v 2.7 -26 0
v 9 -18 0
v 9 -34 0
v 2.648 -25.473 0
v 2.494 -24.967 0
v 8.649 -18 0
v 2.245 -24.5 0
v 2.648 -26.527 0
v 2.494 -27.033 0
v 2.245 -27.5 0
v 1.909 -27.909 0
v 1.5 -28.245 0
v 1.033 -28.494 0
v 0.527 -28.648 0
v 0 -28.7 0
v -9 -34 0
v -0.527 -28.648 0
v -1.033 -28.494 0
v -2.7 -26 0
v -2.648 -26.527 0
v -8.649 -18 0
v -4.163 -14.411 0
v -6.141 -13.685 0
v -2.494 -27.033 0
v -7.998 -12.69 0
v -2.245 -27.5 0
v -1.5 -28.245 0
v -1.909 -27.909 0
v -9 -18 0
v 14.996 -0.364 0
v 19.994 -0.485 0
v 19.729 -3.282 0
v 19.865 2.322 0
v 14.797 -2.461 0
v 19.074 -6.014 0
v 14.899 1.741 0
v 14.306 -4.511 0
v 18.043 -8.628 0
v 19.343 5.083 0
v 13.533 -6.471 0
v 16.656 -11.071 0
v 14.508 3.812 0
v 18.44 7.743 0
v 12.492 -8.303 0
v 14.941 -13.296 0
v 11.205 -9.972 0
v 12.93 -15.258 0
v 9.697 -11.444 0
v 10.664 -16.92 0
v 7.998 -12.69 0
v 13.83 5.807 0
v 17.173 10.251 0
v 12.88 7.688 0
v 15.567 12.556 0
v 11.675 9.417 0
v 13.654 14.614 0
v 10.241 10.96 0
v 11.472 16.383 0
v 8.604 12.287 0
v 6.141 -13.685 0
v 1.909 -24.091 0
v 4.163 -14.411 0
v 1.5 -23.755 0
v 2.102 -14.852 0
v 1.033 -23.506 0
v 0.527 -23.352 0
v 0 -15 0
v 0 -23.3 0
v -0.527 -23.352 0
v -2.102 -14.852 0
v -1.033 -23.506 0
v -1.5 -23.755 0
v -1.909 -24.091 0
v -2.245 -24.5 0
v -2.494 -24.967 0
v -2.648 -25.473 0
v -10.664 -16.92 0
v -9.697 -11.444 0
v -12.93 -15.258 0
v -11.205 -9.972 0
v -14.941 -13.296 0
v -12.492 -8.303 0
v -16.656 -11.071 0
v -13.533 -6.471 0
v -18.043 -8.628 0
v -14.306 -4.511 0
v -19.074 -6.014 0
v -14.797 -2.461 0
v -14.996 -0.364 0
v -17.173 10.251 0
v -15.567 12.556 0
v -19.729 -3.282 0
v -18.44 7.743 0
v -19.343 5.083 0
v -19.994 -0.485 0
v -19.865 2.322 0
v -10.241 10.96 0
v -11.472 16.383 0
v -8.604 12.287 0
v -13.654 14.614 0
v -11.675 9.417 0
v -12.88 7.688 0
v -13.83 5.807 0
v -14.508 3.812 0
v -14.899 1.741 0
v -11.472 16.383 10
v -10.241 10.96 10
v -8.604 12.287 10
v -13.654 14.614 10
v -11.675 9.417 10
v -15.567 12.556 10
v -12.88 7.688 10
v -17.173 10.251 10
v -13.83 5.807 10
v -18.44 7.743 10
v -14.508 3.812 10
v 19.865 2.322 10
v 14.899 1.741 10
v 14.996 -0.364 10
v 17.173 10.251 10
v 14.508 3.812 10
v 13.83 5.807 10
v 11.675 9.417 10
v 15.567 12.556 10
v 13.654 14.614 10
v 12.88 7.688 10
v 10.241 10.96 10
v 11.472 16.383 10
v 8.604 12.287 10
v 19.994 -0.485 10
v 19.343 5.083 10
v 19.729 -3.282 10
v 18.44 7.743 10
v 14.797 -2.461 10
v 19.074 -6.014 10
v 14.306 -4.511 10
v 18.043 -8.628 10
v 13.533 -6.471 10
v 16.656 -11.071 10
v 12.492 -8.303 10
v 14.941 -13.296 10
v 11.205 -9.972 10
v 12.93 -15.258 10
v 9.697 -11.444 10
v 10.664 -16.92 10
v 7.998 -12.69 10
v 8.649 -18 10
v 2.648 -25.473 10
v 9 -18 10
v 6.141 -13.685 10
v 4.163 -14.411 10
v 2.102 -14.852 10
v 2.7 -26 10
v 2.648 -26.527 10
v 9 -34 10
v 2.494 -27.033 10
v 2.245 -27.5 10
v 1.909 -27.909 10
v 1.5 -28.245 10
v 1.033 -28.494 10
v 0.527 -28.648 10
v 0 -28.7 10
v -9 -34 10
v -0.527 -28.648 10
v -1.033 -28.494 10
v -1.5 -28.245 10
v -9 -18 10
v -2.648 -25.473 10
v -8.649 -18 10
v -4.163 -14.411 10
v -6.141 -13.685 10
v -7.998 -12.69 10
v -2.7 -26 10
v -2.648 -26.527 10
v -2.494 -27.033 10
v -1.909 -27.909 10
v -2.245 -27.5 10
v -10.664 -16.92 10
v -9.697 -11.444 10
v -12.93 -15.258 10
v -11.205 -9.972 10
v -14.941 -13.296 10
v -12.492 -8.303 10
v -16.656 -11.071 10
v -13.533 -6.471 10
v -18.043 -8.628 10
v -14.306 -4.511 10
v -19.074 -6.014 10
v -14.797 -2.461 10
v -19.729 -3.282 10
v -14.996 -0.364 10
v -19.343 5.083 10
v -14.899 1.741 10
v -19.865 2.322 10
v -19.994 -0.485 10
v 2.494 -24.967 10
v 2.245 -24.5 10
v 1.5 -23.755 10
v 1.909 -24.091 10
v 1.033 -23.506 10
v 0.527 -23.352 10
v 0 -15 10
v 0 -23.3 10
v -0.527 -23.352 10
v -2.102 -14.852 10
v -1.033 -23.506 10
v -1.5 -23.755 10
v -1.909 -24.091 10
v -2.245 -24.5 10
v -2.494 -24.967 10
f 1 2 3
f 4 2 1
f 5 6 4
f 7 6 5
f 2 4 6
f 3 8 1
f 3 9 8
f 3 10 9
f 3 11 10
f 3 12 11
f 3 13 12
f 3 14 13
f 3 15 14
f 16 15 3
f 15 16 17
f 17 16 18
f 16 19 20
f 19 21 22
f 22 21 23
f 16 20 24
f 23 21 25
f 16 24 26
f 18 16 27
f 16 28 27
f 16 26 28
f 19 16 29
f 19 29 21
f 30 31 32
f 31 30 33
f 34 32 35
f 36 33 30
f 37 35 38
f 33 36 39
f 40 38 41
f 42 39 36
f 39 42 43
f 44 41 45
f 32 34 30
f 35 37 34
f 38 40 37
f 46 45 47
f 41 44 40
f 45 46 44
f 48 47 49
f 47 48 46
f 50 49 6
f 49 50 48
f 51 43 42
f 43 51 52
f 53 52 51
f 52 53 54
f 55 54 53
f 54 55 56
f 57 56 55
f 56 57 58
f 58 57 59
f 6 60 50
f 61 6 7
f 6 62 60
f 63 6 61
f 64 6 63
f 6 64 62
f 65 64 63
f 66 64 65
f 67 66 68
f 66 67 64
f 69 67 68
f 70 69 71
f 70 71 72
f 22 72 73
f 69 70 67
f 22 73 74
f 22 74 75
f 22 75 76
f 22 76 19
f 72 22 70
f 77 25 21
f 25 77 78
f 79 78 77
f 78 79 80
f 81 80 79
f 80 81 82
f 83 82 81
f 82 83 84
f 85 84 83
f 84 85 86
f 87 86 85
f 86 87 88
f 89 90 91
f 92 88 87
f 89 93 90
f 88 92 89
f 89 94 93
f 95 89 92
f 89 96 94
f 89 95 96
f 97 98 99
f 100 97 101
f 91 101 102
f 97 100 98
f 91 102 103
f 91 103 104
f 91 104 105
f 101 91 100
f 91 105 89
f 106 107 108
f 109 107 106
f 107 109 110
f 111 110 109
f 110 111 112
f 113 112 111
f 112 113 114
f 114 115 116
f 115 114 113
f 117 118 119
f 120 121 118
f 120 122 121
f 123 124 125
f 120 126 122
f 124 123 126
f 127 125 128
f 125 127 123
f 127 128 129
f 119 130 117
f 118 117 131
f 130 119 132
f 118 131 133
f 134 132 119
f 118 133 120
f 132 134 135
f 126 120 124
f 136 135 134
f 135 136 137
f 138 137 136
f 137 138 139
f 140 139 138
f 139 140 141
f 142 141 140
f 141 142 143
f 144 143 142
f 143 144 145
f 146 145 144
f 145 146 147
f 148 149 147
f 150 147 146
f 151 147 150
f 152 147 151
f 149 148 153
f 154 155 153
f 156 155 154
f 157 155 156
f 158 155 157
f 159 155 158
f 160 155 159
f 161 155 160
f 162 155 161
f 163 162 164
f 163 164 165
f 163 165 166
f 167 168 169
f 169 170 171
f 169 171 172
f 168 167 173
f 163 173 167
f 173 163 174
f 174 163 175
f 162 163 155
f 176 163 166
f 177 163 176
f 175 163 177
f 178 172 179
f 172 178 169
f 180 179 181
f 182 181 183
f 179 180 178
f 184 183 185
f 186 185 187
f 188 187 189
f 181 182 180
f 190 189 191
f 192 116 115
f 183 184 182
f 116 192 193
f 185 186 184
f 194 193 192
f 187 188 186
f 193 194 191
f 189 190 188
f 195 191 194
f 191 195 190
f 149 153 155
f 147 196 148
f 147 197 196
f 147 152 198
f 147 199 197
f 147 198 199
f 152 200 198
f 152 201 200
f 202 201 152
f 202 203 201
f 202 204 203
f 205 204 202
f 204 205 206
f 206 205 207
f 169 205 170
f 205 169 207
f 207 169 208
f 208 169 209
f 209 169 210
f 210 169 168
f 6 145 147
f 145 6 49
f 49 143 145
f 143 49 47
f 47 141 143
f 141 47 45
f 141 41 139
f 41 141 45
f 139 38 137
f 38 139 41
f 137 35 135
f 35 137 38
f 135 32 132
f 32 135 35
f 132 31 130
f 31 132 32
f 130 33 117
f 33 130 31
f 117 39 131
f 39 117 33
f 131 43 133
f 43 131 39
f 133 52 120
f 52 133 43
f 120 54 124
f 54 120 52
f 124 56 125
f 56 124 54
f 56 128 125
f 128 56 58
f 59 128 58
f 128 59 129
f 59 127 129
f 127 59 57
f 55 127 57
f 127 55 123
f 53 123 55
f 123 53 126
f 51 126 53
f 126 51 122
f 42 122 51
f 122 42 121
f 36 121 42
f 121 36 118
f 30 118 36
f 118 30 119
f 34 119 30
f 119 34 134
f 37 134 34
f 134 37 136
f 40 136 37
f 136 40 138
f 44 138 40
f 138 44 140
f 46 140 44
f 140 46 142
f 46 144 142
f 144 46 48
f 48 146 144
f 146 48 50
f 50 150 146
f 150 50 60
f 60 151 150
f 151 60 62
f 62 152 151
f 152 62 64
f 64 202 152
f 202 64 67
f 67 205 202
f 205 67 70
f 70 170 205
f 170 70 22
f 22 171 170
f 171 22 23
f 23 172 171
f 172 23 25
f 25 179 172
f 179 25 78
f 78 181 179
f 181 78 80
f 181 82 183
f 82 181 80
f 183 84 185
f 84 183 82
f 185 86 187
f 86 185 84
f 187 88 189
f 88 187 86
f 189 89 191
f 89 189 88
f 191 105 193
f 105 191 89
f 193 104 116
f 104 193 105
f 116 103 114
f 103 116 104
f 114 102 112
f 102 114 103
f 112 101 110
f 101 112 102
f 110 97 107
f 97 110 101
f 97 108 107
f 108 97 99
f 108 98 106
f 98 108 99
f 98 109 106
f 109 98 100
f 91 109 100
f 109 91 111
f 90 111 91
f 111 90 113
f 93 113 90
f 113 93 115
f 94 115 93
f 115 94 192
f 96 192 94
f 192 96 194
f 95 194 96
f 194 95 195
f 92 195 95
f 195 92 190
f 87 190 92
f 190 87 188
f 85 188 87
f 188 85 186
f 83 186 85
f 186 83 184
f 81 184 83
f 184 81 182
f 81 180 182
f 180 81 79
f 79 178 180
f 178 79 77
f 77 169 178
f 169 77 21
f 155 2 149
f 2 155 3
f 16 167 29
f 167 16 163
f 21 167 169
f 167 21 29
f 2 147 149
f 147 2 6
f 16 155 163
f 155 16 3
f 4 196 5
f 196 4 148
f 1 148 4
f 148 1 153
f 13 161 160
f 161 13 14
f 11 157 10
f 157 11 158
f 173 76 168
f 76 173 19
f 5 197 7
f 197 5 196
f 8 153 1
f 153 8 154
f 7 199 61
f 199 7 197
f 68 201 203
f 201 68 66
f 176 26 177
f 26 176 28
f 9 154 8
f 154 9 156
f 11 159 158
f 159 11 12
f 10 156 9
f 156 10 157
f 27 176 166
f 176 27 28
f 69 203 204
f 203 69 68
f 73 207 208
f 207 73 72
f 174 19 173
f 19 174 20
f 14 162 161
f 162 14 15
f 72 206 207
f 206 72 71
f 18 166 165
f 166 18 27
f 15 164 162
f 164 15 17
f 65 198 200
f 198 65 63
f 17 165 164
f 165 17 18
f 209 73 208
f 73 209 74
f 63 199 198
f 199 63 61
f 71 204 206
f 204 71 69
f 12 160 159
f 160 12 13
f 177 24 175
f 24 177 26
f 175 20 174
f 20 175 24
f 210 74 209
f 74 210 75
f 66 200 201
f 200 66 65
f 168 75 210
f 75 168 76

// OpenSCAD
$fn = 32;

// ----------------------------------------------------------------------
// Spring clip: 40 mm outside, 5 mm band, 70 degree opening
// ----------------------------------------------------------------------

// --- parameters (mm) ---
outer_r = 20;             // clip outside radius
inner_r = 15;             // clip bore radius
band = 5;                 // band thickness
clip_w = 10;              // clip width
opening = 70;             // opening angle
tab_w = 18;               // tab width
tab_len = 14;             // tab length past the clip
tab_hole = 5.4;           // tab fixing hole

clip_profile = [[-11.472, 16.383], [-13.654, 14.614], [-15.567, 12.556], [-17.173, 10.251], [-18.44, 7.743], [-19.343, 5.083], [-19.865, 2.322], [-19.994, -0.485], [-19.729, -3.282], [-19.074, -6.014], [-18.043, -8.628], [-16.656, -11.071], [-14.941, -13.296], [-12.93, -15.258], [-10.664, -16.92], [-8.188, -18.247], [-5.55, -19.215], [-2.803, -19.803], [0, -20], [2.803, -19.803], [5.55, -19.215], [8.188, -18.247], [10.664, -16.92], [12.93, -15.258], [14.941, -13.296], [16.656, -11.071], [18.043, -8.628], [19.074, -6.014], [19.729, -3.282], [19.994, -0.485], [19.865, 2.322], [19.343, 5.083], [18.44, 7.743], [17.173, 10.251], [15.567, 12.556], [13.654, 14.614], [11.472, 16.383], [8.604, 12.287], [10.241, 10.96], [11.675, 9.417], [12.88, 7.688], [13.83, 5.807], [14.508, 3.812], [14.899, 1.741], [14.996, -0.364], [14.797, -2.461], [14.306, -4.511], [13.533, -6.471], [12.492, -8.303], [11.205, -9.972], [9.697, -11.444], [7.998, -12.69], [6.141, -13.685], [4.163, -14.411], [2.102, -14.852], [0, -15], [-2.102, -14.852], [-4.163, -14.411], [-6.141, -13.685], [-7.998, -12.69], [-9.697, -11.444], [-11.205, -9.972], [-12.492, -8.303], [-13.533, -6.471], [-14.306, -4.511], [-14.797, -2.461], [-14.996, -0.364], [-14.899, 1.741], [-14.508, 3.812], [-13.83, 5.807], [-12.88, 7.688], [-11.675, 9.417], [-10.241, 10.96], [-8.604, 12.287]];

difference() {
  union() {
    linear_extrude(height = clip_w) polygon(clip_profile);
    /* mounting tab, sunk 2 mm into the band */
    translate([-9, -34, 0]) cube([tab_w, 16, clip_w]);
  }
  translate([0, -26, -2.5]) cylinder(h = clip_w + 5, d = tab_hole);
}
